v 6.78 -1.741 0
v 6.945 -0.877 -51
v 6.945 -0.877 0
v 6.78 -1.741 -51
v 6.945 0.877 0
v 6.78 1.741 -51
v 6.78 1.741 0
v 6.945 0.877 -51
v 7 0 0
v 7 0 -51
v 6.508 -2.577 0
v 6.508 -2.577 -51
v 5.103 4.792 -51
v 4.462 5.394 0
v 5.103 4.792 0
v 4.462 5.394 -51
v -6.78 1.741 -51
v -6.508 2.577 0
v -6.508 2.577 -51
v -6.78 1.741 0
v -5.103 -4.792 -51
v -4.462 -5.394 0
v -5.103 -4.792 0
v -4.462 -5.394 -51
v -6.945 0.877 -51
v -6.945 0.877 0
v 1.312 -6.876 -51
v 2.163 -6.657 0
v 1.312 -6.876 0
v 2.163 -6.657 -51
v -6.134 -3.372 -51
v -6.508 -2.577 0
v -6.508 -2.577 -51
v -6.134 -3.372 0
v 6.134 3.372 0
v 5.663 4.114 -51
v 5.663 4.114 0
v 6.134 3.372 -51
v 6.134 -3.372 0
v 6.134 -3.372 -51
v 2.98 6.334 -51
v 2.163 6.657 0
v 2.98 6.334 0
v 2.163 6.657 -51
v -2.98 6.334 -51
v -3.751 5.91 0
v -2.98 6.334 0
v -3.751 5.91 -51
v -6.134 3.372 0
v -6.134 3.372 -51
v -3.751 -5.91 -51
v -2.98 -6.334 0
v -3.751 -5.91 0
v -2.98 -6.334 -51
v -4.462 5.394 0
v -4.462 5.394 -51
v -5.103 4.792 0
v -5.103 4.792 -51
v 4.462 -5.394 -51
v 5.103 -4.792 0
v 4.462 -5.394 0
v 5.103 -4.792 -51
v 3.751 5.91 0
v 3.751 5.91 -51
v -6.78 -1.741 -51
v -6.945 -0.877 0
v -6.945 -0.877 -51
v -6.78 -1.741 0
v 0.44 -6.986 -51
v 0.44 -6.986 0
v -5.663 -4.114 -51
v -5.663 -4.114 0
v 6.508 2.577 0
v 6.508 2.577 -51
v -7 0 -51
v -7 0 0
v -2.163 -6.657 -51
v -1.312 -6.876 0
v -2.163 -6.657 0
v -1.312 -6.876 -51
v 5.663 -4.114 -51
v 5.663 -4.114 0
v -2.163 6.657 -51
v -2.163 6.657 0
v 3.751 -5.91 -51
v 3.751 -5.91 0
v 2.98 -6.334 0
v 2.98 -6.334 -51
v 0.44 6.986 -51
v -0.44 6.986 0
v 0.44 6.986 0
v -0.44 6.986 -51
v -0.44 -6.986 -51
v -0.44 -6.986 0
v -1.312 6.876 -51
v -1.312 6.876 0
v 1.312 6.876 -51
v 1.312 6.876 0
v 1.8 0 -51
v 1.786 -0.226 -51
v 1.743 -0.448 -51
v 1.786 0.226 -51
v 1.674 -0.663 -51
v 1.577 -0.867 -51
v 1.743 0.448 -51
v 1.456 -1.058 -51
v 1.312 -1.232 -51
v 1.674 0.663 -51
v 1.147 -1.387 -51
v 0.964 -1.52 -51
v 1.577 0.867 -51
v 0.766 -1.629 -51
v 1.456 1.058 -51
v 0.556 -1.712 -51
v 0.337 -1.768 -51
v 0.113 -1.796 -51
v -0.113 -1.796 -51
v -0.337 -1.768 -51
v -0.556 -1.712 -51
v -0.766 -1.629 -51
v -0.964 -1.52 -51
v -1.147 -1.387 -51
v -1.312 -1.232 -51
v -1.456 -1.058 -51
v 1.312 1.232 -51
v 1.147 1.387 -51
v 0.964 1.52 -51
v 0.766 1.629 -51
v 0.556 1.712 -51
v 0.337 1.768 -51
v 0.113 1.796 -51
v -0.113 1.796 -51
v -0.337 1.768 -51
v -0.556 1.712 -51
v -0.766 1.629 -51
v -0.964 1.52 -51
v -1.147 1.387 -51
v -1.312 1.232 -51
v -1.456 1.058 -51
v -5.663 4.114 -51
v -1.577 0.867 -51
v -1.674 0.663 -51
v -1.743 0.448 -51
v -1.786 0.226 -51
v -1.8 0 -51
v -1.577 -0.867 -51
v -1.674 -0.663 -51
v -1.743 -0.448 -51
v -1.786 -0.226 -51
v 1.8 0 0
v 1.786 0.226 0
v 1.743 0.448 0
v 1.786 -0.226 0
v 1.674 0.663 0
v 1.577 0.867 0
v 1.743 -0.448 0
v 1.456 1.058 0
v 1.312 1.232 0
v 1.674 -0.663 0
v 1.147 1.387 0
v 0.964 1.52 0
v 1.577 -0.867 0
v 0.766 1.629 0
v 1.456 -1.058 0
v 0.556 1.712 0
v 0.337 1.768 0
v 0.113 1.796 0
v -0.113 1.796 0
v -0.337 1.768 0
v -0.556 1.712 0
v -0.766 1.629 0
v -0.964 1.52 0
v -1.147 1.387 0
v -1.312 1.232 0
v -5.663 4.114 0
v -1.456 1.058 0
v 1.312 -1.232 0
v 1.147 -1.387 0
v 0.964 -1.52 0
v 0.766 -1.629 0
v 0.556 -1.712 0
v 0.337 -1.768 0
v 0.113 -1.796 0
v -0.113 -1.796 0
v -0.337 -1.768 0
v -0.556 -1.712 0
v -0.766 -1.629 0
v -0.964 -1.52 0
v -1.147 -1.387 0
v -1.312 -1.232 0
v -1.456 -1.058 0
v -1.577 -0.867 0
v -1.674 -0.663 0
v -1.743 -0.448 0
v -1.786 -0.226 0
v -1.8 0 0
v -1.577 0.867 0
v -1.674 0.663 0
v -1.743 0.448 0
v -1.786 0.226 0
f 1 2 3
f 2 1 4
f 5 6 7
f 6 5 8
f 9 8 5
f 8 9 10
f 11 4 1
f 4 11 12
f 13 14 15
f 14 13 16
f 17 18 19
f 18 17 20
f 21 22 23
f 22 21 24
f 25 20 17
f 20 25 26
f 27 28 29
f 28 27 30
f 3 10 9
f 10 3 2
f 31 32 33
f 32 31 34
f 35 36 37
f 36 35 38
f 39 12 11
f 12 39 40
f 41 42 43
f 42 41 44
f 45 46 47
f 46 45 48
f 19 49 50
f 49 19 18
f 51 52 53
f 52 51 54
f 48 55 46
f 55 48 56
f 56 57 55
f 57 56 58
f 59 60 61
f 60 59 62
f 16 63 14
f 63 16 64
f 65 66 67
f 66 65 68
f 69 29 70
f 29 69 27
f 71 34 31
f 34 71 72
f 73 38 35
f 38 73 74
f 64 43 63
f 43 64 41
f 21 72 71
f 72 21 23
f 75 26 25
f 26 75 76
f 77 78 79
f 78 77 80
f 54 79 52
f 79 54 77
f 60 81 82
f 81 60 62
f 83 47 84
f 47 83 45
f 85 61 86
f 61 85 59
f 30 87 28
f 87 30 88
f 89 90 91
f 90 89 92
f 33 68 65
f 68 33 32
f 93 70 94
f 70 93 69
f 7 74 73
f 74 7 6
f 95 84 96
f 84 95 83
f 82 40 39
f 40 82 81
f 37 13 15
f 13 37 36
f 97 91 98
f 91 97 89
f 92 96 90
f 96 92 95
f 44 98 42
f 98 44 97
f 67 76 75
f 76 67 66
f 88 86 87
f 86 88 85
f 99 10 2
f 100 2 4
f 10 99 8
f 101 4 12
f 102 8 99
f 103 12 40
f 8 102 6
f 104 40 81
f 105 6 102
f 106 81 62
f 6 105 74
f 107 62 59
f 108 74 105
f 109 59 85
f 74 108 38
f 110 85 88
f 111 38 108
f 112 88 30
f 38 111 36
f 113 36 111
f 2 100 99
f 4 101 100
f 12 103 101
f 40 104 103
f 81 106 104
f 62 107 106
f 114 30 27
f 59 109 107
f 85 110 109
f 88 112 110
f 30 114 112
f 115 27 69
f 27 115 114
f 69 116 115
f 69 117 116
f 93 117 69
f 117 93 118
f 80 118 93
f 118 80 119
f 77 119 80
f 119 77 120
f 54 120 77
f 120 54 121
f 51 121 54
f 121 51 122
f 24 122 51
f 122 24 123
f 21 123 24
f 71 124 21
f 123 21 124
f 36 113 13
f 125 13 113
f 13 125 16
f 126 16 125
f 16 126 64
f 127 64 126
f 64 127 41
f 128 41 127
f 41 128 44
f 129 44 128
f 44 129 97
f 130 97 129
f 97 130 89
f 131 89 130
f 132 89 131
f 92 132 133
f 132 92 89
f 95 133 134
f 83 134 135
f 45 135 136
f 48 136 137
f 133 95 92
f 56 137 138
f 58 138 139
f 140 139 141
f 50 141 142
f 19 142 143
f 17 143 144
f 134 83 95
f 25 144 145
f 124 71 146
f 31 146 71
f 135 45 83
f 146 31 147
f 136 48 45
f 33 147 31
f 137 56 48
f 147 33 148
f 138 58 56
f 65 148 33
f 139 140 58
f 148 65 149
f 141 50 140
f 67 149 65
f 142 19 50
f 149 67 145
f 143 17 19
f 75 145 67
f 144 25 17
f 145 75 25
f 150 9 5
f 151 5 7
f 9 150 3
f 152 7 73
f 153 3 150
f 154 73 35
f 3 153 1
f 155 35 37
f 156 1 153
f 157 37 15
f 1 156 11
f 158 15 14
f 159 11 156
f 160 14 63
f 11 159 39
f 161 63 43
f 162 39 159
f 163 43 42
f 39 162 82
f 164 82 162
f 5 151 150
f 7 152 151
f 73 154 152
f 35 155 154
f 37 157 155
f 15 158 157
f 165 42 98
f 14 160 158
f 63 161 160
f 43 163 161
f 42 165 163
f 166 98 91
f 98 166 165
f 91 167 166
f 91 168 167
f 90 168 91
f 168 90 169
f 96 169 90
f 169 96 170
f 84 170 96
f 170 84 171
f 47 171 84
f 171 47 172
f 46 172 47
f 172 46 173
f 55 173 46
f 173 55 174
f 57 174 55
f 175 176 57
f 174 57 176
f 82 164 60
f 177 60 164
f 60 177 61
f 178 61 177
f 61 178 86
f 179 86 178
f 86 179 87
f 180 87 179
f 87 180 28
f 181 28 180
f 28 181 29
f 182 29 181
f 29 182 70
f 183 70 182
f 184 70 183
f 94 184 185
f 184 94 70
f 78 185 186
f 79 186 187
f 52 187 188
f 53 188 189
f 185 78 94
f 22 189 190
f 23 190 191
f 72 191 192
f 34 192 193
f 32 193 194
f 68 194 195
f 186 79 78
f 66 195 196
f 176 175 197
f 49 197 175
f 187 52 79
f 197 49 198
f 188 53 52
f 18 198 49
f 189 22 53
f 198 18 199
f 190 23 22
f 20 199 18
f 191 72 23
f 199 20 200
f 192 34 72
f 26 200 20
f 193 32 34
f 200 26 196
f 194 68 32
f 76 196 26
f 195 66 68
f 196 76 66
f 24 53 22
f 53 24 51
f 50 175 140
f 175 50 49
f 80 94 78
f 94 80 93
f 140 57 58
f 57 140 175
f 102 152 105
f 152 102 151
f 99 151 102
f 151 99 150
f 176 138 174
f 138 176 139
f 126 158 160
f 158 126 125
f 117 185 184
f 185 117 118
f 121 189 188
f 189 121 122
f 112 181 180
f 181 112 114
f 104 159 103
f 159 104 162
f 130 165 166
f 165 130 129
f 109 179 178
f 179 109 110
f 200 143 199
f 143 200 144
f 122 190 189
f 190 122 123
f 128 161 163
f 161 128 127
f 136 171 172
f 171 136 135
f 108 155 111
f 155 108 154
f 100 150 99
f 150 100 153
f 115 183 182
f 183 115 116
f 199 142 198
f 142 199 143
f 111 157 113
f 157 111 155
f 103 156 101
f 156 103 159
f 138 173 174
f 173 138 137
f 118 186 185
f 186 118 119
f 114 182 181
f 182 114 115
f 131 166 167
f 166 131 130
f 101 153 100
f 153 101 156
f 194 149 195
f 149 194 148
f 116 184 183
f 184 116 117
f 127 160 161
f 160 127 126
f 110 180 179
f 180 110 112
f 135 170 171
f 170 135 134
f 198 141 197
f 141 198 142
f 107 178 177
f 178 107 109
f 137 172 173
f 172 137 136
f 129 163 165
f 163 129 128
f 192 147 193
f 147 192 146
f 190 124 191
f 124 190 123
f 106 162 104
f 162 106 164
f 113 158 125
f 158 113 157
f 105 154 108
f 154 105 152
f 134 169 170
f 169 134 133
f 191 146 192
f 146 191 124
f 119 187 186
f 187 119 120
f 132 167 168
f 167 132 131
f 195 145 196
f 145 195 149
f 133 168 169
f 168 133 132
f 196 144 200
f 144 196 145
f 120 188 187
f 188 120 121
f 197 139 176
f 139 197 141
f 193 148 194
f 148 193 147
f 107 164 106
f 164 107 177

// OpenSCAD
$fn = 50;


difference() {
	union() {
		translate(v = [0, 0, -51.0000000000]) {
			cylinder(h = 51, r = 7.0000000000);
		}
		cylinder(h = 0, r = 10.0000000000);
	}
	union() {
		#translate(v = [0, 0, -51]) {
			cylinder(h = 51, r = 1.8000000000);
		}
	}
}
